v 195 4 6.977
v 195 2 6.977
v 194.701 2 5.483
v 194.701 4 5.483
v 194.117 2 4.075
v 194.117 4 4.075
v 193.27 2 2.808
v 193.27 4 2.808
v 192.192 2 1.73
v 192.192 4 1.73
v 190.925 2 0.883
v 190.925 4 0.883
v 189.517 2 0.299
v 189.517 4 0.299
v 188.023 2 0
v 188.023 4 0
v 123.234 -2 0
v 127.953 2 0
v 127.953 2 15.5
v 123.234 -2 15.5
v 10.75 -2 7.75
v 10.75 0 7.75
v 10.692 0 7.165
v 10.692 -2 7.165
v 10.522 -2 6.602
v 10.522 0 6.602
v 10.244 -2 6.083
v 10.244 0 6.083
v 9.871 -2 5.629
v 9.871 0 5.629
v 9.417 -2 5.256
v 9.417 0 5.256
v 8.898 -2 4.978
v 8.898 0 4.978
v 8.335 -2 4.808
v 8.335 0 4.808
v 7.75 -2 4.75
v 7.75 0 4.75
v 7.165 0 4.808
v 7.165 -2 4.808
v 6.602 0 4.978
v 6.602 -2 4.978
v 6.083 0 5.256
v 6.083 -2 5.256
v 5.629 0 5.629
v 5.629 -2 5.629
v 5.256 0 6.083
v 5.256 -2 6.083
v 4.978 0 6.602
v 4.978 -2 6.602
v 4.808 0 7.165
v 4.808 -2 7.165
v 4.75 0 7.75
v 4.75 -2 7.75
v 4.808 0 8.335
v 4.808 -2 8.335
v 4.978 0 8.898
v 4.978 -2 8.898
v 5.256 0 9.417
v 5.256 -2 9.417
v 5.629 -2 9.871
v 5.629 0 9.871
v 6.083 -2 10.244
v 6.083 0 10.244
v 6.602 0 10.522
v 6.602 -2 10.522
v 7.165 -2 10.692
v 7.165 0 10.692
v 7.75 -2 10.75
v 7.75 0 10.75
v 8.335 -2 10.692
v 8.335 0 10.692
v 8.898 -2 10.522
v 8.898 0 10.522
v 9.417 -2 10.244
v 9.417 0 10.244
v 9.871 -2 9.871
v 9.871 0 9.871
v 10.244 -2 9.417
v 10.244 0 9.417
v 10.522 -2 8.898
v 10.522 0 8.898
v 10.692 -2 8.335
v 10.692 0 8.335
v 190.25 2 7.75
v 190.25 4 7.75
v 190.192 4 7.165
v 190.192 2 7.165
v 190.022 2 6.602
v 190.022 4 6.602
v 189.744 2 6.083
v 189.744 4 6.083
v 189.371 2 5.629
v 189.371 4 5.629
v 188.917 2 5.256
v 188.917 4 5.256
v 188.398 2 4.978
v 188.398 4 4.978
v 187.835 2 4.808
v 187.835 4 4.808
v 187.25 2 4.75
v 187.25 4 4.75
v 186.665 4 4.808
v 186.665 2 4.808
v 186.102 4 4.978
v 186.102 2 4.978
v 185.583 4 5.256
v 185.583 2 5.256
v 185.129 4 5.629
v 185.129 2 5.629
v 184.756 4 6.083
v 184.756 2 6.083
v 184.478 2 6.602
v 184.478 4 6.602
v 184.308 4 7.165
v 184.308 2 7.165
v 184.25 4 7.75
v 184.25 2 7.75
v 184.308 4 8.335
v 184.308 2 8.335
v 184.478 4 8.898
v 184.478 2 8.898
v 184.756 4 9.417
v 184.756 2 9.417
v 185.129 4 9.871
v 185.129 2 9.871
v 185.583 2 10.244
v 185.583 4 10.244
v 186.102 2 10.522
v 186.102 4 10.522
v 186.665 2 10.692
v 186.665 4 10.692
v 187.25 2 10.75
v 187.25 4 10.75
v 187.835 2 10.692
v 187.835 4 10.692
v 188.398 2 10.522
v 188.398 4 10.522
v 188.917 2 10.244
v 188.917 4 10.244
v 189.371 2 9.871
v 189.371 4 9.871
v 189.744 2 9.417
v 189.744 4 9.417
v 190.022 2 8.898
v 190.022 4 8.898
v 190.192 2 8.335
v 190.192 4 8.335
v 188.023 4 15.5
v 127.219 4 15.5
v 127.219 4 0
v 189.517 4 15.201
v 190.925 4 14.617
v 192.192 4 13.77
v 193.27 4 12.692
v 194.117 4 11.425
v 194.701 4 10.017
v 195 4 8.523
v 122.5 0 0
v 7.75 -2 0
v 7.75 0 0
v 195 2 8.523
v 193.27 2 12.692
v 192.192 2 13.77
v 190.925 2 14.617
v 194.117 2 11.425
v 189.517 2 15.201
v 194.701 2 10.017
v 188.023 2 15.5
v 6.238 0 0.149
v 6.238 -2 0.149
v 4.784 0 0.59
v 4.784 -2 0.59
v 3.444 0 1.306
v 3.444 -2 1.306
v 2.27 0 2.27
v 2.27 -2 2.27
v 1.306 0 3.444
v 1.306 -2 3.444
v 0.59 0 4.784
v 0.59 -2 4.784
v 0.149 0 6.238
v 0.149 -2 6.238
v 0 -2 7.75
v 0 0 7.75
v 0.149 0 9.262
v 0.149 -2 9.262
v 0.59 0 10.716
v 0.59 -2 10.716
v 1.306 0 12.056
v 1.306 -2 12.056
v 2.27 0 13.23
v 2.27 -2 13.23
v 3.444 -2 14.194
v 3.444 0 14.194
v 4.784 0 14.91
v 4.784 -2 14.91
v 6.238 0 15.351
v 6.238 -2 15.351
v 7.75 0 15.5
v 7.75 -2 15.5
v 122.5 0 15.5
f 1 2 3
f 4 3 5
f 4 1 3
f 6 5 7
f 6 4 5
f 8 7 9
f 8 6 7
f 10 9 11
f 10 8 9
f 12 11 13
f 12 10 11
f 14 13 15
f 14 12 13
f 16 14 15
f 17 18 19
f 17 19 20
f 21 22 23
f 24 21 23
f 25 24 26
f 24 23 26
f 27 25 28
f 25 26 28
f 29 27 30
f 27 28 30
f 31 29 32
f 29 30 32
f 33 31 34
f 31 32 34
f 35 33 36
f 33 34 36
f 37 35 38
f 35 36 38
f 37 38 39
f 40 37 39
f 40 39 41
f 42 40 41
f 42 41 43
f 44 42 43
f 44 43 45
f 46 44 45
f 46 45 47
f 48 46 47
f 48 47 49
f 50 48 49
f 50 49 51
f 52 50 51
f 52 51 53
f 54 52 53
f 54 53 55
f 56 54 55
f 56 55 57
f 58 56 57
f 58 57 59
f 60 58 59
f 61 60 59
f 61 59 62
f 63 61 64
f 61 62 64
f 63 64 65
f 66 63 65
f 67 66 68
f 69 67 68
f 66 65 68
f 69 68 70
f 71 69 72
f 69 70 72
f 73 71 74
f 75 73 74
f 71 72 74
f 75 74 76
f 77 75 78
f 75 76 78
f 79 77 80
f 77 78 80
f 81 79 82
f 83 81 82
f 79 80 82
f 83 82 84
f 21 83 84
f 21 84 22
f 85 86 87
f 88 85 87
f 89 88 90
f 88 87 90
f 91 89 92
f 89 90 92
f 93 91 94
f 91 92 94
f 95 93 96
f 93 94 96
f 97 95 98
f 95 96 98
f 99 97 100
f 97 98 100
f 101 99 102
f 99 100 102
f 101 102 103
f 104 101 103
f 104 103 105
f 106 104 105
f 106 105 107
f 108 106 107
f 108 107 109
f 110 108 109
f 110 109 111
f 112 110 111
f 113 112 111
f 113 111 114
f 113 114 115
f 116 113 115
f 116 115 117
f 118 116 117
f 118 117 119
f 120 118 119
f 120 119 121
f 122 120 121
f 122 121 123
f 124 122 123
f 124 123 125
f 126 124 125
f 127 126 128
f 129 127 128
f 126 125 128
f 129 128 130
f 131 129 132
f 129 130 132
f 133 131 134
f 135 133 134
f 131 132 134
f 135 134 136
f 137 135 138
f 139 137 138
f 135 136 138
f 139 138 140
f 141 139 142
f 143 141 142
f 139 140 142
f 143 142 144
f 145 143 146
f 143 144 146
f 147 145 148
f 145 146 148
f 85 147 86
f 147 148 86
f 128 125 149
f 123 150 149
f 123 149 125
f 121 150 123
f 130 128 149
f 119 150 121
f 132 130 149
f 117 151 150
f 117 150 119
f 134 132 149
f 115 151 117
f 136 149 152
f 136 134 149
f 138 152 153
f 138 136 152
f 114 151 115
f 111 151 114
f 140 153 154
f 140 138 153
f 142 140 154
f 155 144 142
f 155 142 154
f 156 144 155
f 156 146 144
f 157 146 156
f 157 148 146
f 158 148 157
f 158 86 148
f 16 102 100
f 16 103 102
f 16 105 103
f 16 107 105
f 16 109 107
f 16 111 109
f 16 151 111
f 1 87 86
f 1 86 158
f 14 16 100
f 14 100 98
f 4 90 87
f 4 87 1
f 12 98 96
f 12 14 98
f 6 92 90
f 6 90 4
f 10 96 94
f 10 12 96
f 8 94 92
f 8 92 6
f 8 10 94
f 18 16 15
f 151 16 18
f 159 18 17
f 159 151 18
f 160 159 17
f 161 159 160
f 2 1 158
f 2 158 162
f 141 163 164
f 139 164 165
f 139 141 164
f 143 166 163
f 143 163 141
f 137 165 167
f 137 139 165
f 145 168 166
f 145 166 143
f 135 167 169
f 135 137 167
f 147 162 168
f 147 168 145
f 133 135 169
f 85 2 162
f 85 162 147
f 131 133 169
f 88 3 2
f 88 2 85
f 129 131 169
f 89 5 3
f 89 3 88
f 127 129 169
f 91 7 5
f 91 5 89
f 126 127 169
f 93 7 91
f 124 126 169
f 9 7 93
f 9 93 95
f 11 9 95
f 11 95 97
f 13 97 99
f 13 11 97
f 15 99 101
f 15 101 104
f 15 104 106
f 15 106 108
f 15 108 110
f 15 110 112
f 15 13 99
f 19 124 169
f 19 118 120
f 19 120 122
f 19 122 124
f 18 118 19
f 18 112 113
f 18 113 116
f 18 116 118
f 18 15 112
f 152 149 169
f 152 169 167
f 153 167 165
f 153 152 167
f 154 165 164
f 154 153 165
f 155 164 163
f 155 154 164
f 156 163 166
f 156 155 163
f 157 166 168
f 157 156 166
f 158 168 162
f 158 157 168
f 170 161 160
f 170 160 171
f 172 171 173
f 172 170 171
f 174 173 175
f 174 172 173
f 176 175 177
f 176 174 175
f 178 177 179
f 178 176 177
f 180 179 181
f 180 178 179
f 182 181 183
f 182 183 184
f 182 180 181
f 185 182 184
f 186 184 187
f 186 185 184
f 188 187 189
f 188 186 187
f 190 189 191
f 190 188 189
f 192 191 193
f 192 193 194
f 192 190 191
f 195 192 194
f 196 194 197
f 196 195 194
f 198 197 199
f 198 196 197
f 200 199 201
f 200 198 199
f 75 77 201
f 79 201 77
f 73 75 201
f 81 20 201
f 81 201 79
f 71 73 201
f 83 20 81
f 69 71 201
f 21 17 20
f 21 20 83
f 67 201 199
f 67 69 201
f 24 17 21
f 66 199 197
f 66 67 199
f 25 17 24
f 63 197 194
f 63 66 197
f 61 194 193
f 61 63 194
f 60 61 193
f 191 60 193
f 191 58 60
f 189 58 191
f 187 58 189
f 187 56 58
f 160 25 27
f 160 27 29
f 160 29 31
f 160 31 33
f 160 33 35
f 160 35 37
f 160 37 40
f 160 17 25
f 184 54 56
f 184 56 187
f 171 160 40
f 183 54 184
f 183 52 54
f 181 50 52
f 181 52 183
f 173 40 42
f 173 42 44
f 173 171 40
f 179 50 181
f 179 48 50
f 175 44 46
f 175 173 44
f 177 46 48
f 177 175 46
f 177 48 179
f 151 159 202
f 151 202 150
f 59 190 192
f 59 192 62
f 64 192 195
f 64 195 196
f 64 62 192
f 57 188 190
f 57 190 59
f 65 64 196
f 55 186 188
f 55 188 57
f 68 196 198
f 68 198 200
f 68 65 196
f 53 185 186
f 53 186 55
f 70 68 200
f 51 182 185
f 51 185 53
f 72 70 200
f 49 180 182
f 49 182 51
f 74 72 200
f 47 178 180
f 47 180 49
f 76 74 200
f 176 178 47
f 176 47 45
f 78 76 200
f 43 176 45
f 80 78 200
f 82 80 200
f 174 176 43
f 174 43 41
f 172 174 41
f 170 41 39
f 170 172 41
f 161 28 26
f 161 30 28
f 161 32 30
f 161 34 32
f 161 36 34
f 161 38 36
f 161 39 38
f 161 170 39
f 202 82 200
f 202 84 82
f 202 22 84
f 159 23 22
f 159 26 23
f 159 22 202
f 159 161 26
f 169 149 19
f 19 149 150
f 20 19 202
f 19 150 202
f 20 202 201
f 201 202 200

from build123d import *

# Parameters (mm, degrees)
EXTRUDE_1_DEPTH     = 15.5
SKETCH_2_OUTSIDE_W  = 236.142
SKETCH_2_OUTSIDE_H  = 56.642
SKETCH_2_OUTSIDE_R  = 3
CUT_EXTRUDE_4_DEPTH = 10


with BuildPart() as part:
    # Эскиз1 → Вытянуть-Тонкостенный1 (new body)
    with BuildSketch(Plane.XY):
        Polygon((0, 0), (122.5, 0), (127.219413382, 4), (195, 4), (195, 2), (127.952959941, 2), (123.233546559, -2), (0, -2), align=None)
    extrude(amount=EXTRUDE_1_DEPTH)

    # Эскиз2 outside → Вырез-Вытянуть4 (cut)
    with BuildSketch(Plane(origin=(0, 4, 0), x_dir=(1, 0, 0), z_dir=(0, 1, 0))):
        with Locations((97.5, -7.75)):
            Rectangle(SKETCH_2_OUTSIDE_W, SKETCH_2_OUTSIDE_H)
        with BuildLine():
            Line((188.022623145, 0), (7.75, 0))
            ThreePointArc((7.75, 0), (0, -7.75), (7.75, -15.5))
            Line((7.75, -15.5), (188.022623145, -15.5))
            ThreePointArc((188.022623145, -15.5), (195.03841746, -7.75), (188.022623145, 0))
        make_face(mode=Mode.SUBTRACT)
        with Locations((187.25, -7.75)):
            Circle(SKETCH_2_OUTSIDE_R)
        with Locations((7.75, -7.75)):
            Circle(SKETCH_2_OUTSIDE_R)
    extrude(amount=-CUT_EXTRUDE_4_DEPTH, mode=Mode.SUBTRACT)


solid = part.part
